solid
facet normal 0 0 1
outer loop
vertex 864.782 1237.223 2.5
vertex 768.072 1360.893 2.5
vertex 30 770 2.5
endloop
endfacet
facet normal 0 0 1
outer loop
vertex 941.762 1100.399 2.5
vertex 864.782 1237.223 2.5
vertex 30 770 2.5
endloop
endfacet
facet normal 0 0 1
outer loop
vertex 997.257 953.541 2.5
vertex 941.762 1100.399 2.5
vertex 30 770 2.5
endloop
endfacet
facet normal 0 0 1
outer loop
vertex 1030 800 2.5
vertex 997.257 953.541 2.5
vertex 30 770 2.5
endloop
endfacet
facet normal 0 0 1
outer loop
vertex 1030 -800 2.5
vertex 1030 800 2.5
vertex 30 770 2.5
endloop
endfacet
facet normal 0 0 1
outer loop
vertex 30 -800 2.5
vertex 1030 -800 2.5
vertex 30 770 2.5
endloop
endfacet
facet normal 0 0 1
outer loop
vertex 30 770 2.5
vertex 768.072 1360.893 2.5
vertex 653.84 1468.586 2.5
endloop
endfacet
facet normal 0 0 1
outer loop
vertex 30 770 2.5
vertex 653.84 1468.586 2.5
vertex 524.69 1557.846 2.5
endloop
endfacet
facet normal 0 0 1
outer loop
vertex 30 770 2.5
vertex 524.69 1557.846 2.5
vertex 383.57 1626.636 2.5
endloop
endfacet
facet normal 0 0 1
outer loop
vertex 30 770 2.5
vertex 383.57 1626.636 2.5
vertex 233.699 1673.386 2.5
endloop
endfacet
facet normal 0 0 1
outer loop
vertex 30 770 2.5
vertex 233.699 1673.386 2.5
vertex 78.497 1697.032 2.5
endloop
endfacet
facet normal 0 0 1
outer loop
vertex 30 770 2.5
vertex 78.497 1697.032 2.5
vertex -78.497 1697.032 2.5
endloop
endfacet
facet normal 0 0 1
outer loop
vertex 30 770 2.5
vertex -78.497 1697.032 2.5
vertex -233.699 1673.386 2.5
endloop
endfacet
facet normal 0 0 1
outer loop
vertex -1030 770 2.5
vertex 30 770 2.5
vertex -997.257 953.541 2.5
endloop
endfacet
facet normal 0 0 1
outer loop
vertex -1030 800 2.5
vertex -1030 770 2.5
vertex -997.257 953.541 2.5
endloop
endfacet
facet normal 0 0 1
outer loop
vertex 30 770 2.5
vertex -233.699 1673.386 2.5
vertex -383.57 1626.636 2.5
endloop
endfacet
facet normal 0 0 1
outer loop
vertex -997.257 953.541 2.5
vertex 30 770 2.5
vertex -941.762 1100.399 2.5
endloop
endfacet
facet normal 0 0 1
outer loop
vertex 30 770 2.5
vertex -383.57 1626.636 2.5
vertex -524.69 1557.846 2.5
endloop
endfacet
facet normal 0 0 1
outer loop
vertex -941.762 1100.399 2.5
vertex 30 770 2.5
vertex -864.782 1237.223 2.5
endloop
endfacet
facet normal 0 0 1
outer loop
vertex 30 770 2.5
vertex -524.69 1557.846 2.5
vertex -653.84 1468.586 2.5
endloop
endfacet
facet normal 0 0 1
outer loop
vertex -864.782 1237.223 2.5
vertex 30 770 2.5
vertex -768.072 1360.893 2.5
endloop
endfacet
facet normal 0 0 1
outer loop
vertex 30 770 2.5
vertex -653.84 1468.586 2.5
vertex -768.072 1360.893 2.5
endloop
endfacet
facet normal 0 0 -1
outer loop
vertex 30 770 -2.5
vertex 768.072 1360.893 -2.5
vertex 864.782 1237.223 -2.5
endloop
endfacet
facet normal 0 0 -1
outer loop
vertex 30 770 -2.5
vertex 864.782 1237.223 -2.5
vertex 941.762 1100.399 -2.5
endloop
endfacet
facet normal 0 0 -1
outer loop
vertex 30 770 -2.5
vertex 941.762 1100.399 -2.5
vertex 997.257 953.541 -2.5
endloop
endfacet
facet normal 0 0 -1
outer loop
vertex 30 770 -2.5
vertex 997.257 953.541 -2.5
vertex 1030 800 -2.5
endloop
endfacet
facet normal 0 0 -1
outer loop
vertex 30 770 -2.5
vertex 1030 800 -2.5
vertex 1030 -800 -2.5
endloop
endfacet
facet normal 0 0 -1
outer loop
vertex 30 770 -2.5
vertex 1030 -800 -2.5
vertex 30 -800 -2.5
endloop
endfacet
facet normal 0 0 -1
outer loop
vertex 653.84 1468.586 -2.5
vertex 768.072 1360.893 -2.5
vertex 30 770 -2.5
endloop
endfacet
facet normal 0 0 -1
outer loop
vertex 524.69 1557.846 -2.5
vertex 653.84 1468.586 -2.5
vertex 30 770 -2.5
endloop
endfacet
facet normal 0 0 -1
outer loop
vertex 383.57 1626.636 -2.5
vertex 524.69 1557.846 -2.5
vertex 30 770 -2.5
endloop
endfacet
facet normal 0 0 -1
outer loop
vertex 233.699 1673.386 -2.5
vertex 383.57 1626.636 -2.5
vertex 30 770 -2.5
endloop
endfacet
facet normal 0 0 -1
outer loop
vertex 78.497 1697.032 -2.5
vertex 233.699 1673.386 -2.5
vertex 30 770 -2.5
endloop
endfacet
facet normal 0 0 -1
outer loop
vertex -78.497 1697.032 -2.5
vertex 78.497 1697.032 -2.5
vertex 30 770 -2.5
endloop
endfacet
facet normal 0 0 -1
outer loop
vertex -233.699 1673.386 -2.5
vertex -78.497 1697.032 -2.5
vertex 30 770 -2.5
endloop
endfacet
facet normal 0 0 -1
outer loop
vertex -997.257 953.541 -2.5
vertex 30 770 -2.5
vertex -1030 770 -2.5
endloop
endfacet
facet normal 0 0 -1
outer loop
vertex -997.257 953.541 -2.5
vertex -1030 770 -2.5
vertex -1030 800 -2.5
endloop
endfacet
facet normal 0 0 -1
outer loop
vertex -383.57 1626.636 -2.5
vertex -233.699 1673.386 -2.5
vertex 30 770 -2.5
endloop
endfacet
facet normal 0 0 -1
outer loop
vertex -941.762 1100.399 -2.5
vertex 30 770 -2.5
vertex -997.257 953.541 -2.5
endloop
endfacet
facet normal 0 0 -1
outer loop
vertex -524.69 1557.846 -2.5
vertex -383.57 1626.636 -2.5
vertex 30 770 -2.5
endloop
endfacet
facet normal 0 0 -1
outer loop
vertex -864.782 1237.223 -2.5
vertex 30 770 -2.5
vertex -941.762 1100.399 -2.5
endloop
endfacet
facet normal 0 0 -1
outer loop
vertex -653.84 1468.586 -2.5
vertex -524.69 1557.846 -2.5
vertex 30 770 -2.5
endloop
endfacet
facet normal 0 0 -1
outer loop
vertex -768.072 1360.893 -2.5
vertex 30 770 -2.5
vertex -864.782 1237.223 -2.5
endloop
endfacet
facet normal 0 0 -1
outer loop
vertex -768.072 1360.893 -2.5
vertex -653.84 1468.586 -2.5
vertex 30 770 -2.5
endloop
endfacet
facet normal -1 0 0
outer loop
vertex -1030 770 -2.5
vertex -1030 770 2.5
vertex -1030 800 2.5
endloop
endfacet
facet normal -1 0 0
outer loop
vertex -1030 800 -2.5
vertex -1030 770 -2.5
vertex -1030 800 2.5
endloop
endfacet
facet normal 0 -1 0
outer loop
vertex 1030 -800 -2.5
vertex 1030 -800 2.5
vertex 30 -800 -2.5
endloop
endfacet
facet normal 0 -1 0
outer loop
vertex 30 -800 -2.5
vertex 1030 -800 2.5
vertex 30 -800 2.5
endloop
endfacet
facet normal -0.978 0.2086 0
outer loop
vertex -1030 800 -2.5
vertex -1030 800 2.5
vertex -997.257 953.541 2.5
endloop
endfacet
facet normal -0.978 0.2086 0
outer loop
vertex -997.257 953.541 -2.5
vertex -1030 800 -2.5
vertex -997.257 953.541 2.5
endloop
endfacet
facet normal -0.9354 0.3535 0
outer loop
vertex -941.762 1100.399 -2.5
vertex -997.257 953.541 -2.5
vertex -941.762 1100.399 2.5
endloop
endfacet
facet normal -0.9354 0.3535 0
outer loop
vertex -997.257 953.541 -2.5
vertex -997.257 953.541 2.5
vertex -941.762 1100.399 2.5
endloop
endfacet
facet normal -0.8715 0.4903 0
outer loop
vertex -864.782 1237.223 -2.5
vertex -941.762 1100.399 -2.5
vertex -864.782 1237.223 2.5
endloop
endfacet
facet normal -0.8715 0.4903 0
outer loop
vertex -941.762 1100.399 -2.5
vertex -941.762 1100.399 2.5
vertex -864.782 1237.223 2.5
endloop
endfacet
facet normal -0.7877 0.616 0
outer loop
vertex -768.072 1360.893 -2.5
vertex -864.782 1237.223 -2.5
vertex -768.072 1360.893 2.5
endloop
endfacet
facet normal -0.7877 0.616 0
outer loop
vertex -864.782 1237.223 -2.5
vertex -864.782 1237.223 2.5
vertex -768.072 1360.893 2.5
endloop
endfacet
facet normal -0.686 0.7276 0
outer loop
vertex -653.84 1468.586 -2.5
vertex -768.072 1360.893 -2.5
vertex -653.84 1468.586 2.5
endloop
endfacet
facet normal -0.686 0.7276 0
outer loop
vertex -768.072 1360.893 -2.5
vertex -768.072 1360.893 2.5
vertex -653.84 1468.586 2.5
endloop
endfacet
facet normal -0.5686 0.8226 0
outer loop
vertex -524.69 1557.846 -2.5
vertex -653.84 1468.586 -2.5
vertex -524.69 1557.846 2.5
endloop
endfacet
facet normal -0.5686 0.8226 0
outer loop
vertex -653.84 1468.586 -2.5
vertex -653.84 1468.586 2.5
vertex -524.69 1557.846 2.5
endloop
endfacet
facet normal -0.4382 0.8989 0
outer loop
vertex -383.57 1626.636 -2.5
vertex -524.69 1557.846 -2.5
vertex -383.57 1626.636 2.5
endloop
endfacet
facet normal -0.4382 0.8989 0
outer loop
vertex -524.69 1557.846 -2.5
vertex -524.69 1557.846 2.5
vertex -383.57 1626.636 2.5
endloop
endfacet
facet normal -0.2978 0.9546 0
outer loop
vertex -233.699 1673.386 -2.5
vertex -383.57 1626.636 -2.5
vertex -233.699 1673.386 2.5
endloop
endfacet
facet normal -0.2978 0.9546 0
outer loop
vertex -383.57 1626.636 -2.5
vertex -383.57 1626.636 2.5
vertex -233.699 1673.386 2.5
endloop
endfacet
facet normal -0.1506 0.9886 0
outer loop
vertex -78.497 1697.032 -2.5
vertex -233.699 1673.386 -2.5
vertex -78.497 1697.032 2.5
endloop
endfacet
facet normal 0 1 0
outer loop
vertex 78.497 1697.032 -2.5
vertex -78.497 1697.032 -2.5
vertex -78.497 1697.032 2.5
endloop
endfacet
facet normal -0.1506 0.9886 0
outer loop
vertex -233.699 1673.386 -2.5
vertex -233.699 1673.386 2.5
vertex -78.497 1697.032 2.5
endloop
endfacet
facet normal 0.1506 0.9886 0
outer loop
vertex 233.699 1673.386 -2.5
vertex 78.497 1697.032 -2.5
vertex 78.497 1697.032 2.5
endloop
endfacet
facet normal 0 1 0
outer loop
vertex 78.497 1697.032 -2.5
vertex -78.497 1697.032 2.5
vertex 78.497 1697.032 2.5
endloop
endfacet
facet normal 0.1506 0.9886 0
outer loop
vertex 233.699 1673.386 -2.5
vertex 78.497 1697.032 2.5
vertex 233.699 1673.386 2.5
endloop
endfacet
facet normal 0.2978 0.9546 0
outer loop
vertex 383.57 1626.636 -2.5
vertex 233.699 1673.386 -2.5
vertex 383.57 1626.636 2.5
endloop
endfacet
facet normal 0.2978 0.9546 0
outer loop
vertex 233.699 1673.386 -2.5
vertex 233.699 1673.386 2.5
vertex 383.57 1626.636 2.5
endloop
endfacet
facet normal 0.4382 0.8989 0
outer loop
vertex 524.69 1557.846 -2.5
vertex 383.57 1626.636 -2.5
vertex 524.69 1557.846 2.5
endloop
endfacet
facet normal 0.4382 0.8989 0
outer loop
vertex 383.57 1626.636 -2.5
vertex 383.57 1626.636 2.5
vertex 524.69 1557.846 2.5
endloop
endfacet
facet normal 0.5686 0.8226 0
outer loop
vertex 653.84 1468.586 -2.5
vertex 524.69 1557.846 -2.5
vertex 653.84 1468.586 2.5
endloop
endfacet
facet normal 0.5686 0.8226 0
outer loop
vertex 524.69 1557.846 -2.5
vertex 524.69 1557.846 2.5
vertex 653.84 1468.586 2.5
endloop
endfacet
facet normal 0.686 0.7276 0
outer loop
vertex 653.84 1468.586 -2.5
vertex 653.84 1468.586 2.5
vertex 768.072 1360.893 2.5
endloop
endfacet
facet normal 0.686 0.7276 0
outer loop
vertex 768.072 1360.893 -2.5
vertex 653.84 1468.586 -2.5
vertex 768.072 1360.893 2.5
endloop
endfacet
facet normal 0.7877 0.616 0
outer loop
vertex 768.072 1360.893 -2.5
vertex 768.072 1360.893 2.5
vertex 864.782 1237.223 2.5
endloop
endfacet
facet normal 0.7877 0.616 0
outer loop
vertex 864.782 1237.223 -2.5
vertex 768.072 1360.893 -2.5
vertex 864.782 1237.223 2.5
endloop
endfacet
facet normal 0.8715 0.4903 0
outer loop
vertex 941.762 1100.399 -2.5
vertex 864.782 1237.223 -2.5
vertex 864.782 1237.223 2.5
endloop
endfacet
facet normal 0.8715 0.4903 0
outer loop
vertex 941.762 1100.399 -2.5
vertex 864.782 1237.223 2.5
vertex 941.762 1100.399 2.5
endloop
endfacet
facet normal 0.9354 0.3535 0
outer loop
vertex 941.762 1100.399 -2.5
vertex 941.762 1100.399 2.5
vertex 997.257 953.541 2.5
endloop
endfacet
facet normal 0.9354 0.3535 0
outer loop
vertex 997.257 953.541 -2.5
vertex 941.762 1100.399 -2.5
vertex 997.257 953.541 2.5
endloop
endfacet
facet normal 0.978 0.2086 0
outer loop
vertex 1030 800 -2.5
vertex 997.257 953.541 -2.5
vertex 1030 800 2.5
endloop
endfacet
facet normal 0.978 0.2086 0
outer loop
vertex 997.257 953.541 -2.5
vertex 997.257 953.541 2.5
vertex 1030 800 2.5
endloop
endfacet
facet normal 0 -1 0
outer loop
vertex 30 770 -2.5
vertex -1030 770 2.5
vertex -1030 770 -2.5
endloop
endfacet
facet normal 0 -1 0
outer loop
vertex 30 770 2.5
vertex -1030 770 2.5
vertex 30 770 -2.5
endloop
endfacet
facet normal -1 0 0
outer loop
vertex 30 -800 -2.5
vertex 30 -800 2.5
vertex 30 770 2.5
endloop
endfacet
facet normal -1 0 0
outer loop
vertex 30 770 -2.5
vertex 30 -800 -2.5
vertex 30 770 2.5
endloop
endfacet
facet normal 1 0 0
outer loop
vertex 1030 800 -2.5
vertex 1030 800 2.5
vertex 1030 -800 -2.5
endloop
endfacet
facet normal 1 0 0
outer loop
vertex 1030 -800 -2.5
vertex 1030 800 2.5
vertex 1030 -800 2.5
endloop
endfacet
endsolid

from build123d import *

# Parameters (mm, degrees)
BOSS_EXTRUDE1_DEPTH = 2.5
SKETCH2_W           = 1060
SKETCH2_H           = 1570
CUT_EXTRUDE2_DEPTH  = 6


with BuildPart() as part:
    # Sketch1 → Boss-Extrude1 (new body, symmetric)
    with BuildSketch(Plane.XY):
        with BuildLine():
            Line((1030, 800), (1030, -800))
            Line((1030, -800), (-1030, -800))
            Line((-1030, -800), (-1030, 800))
            ThreePointArc((-1030, 800), (0, 1700), (1030, 800))
        make_face()
    extrude(amount=BOSS_EXTRUDE1_DEPTH, both=True)

    # Sketch2 → Cut-Extrude2 (cut, through all)
    with BuildSketch(Plane.XY.offset(2.5)):
        with Locations((-500, -15)):
            Rectangle(SKETCH2_W, SKETCH2_H)
    extrude(amount=-CUT_EXTRUDE2_DEPTH, mode=Mode.SUBTRACT)


solid = part.part
